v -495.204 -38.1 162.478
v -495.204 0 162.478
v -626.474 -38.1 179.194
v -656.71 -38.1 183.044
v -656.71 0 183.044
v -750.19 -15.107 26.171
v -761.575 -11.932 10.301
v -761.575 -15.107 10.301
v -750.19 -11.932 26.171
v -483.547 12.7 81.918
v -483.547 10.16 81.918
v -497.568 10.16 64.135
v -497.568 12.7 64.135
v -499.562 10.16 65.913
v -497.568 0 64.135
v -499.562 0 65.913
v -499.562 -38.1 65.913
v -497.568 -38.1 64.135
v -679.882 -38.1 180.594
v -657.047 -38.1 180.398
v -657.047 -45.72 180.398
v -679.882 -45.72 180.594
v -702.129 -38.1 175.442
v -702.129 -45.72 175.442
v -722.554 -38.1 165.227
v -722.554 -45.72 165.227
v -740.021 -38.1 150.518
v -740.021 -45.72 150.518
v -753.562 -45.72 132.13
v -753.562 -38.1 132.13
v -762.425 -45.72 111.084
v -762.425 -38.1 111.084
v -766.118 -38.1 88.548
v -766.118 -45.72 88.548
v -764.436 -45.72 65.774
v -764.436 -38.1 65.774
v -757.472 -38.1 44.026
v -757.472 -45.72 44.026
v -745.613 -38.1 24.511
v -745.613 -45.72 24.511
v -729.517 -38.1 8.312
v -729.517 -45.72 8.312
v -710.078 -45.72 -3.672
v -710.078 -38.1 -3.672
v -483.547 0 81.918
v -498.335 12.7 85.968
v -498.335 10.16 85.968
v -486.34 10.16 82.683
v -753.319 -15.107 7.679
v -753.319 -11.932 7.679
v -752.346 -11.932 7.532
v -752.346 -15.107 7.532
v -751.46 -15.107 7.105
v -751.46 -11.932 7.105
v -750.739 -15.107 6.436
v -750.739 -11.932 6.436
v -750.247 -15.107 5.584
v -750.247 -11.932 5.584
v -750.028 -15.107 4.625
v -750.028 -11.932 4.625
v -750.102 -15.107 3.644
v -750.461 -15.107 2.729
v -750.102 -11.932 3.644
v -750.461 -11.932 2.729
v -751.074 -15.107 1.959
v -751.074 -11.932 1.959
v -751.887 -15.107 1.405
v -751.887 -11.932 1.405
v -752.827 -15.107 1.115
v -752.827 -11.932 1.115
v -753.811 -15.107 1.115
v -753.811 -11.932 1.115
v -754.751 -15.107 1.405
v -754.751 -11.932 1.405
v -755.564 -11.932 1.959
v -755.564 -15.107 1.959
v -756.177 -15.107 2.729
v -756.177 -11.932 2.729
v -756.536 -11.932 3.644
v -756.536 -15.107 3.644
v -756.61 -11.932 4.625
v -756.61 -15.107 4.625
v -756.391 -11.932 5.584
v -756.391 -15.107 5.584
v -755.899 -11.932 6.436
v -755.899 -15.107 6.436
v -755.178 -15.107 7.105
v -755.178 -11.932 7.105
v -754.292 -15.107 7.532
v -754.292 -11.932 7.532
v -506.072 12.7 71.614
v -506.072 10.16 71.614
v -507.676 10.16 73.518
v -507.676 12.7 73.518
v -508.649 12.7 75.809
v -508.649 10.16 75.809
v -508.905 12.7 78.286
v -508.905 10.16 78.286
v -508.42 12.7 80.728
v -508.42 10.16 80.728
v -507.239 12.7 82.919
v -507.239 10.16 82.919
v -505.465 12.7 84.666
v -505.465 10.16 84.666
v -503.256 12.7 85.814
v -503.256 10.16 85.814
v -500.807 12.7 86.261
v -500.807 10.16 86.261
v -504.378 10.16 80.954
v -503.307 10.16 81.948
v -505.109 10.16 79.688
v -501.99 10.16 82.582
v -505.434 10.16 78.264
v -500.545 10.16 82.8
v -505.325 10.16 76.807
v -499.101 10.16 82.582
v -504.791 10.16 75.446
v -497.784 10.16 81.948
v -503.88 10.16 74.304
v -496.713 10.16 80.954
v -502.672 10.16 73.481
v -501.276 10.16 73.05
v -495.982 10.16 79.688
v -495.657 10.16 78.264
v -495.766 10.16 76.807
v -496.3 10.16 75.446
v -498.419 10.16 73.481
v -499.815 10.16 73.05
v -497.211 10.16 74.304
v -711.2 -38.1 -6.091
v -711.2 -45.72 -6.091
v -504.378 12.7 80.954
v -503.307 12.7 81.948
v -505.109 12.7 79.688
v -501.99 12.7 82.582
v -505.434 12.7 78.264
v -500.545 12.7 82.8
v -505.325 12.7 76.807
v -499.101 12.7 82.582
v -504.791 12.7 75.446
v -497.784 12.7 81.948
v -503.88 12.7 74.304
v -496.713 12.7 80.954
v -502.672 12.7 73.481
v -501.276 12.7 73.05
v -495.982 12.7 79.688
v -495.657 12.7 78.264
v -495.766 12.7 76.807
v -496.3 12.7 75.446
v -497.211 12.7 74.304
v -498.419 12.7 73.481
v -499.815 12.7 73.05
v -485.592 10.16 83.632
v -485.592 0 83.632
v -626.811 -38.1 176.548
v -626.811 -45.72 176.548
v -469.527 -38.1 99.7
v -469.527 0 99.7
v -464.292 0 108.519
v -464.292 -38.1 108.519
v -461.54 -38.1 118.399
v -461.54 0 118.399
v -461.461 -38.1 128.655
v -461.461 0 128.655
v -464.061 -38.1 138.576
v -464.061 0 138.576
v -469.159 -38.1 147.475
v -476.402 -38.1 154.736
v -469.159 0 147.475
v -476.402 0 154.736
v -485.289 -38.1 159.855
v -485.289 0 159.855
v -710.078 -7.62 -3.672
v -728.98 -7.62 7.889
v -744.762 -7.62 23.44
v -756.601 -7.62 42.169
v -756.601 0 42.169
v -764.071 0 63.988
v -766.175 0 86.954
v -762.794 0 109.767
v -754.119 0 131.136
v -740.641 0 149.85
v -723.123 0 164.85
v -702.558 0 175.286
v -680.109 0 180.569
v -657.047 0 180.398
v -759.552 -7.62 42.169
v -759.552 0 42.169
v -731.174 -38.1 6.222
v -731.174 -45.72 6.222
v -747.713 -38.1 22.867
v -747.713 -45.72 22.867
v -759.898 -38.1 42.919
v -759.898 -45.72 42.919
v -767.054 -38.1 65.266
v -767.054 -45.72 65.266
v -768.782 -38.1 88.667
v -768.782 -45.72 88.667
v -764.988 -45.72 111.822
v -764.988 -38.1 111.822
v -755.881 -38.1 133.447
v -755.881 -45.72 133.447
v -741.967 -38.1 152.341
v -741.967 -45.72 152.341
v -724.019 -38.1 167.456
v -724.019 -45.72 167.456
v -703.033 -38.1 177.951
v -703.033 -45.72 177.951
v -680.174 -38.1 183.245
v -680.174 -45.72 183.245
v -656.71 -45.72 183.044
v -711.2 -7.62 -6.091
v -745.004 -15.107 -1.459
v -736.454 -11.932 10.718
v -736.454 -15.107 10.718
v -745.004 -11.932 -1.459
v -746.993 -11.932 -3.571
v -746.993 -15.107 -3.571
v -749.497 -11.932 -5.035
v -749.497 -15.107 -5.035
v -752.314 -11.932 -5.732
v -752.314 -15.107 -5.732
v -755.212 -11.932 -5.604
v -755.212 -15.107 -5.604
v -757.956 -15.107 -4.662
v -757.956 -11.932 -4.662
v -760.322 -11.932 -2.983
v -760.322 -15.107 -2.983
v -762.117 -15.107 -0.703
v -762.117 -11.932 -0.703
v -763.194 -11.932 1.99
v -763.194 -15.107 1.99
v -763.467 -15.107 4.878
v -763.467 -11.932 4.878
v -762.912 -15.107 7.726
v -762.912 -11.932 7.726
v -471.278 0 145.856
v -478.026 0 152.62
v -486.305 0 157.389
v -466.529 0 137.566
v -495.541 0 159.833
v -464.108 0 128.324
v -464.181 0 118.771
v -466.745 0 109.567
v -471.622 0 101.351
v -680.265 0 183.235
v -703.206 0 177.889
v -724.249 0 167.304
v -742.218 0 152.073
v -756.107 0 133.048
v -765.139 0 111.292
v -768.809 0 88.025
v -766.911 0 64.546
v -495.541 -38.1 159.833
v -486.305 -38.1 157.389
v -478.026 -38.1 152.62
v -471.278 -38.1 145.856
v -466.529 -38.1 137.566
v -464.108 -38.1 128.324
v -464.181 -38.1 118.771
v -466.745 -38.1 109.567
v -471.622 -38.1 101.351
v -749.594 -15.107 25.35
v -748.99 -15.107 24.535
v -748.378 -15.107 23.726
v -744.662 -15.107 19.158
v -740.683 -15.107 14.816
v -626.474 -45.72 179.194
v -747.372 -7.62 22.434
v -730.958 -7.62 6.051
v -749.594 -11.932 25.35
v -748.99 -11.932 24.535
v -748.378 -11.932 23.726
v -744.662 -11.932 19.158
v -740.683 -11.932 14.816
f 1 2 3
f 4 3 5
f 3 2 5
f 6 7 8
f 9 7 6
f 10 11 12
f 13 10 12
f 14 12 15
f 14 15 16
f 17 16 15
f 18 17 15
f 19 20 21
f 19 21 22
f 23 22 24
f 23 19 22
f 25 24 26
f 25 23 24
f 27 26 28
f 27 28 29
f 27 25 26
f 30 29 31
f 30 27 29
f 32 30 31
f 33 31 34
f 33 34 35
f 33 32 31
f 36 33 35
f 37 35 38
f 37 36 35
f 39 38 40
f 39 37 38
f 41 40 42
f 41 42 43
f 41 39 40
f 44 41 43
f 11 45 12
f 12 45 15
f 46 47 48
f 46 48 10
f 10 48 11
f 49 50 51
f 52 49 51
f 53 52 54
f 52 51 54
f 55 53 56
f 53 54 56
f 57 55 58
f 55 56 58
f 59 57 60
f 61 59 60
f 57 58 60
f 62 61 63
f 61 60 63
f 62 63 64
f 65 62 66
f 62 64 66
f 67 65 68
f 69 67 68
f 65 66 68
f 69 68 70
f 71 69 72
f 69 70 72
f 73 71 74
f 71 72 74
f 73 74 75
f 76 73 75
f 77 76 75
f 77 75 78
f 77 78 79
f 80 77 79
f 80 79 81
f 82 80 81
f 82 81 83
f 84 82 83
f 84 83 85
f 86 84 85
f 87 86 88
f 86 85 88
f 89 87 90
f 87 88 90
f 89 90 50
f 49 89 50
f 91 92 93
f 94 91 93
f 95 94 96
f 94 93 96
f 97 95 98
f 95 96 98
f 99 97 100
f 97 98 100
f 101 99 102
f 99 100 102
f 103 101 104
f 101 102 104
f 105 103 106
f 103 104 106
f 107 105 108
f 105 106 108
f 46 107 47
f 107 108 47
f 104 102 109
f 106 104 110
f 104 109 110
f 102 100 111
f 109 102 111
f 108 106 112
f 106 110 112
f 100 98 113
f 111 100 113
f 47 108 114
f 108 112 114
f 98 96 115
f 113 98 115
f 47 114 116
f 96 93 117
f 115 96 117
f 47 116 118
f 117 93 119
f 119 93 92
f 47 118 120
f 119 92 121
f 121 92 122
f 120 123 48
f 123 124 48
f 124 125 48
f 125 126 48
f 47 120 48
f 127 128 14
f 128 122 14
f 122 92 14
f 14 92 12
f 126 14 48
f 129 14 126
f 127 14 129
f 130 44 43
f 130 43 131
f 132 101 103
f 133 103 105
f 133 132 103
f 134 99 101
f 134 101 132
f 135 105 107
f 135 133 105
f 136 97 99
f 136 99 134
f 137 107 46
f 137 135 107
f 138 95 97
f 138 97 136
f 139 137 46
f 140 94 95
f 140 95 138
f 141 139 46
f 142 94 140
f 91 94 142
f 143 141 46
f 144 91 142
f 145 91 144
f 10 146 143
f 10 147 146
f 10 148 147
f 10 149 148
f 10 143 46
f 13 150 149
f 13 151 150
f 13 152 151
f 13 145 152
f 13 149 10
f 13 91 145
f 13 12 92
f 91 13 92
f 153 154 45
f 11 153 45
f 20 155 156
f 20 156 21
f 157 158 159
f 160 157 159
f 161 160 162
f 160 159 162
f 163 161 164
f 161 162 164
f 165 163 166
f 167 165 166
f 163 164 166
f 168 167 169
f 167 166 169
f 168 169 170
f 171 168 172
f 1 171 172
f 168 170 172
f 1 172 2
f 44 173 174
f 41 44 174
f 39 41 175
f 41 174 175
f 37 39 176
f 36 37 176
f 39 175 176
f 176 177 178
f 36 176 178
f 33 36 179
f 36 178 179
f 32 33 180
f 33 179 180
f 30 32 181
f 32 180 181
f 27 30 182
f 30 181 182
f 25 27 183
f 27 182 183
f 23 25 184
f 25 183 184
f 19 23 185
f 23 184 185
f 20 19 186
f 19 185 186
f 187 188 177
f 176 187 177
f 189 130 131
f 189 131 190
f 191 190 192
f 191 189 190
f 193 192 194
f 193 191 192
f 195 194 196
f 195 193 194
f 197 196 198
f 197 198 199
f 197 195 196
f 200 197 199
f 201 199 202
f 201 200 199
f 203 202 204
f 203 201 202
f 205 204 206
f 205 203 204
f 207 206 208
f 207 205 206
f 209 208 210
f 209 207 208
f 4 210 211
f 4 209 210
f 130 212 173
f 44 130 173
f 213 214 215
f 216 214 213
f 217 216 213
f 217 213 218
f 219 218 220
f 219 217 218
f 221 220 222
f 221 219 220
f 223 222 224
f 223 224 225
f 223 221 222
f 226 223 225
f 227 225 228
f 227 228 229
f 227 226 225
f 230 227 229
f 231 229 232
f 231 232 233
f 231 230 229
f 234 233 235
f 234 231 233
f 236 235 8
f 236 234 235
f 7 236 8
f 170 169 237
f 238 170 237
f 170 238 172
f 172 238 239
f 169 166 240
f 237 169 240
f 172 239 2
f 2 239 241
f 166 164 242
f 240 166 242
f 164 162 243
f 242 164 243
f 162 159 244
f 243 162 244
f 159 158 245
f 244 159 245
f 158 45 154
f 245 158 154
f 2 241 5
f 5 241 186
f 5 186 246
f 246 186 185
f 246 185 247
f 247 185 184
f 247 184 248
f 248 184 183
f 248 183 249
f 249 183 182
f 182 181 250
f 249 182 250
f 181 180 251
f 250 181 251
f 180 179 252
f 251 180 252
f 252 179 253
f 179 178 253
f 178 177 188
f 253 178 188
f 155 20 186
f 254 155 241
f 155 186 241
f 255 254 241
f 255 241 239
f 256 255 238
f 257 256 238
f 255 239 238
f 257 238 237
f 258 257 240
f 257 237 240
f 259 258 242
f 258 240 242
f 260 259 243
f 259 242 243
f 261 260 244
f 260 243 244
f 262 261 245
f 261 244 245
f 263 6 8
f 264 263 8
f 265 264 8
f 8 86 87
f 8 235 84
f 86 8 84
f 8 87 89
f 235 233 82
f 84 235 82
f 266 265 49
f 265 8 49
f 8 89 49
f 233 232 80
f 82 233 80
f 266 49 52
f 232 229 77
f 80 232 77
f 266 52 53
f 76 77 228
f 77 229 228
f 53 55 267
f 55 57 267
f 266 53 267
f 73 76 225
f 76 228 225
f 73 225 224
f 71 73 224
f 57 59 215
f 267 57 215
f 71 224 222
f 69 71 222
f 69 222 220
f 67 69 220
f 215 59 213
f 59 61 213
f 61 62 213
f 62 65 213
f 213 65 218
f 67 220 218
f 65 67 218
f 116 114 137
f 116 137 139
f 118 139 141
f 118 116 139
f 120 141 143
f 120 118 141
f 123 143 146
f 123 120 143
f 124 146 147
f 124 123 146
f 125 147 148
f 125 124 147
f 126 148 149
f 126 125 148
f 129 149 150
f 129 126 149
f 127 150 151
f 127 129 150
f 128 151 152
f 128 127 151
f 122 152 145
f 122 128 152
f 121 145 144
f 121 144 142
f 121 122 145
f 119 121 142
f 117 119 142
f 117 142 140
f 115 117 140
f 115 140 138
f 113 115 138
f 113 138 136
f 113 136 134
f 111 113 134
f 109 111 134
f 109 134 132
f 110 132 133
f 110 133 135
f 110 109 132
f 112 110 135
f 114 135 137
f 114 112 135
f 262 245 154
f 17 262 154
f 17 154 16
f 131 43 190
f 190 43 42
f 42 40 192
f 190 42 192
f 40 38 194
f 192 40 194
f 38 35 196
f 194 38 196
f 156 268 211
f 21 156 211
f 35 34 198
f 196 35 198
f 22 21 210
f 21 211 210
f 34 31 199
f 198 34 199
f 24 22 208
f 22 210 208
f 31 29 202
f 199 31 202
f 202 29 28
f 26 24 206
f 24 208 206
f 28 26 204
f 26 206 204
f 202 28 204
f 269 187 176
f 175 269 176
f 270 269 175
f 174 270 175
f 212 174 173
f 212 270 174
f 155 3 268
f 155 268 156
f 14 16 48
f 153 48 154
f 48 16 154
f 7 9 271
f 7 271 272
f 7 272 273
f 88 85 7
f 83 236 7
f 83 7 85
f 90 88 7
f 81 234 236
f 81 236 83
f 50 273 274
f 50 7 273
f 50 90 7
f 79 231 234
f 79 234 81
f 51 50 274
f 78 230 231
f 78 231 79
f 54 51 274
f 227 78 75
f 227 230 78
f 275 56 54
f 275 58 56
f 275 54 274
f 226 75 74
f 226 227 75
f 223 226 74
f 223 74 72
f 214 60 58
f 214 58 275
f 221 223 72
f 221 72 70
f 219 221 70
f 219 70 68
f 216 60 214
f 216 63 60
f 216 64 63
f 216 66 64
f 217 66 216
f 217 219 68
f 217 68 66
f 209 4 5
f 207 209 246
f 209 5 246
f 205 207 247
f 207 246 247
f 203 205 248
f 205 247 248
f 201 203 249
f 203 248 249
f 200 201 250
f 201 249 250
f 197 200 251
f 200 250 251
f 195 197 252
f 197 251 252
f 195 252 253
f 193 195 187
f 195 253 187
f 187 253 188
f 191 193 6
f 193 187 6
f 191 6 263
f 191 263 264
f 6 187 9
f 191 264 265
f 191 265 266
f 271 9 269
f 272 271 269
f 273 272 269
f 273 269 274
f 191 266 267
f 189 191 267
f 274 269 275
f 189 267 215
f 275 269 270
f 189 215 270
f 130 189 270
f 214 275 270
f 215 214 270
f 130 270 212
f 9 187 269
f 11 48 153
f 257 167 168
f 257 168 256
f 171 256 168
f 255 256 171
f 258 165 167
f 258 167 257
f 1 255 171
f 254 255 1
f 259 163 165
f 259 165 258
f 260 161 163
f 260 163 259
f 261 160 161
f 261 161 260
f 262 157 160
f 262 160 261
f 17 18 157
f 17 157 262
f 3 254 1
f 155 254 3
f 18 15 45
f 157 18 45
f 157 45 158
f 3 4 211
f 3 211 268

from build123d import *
from build123d.topology import SkipClean

# Parameters (mm, degrees)
BASE_FLANGE1_DEPTH  = 38.1
CUT_EXTRUDE1_DEPTH  = 7.62
SKETCH9_R           = 3.3
BOSS_EXTRUDE1_DEPTH = 3.175
BOSS_EXTRUDE2_DEPTH = 7.62
BOSS_EXTRUDE4_DEPTH = 10.16
SKETCH14_R          = 4.9022
BOSS_EXTRUDE5_DEPTH = 2.54


# Sheet-metal steps are written as plain solids
with BuildPart() as part:
    # Sketch1 → Base-Flange1 (new body)
    with BuildSketch(Plane(origin=(0, 0, 0), x_dir=(1, 0, 0), z_dir=(0, 1, 0))):
        with BuildLine():
            Line((-657.047015903, -180.398251424), (-495.540915967, -159.83264605))
            ThreePointArc((-495.540915967, -159.83264605), (-466.529161595, -137.56639807), (-471.621526187, -101.351269827))
            Line((-471.621526187, -101.351269827), (-499.562056453, -65.912999952))
            Line((-499.562056453, -65.912999952), (-497.56764915, -64.134999952))
            Line((-497.56764915, -64.134999952), (-469.527179345, -99.700027778))
            ThreePointArc((-469.527179345, -99.700027778), (-464.060656724, -138.576037958), (-495.204030033, -162.478283377))
            Line((-495.204030033, -162.478283377), (-656.710129969, -183.043888751))
            ThreePointArc((-656.710129969, -183.043888751), (-764.987734735, -111.822063922), (-711.2, 6.090902363))
            Line((-711.2, 6.090902363), (-710.077660148, 3.671554877))
            ThreePointArc((-710.077660148, 3.671554877), (-762.424972114, -111.083730158), (-657.047015903, -180.398251424))
        make_face()
    extrude(amount=-BASE_FLANGE1_DEPTH)

    # Sketch7 → Cut-Extrude1 (cut)
    with BuildSketch(Plane(origin=(-711.2, 0, -6.090902363), x_dir=(1, 0, 0), z_dir=(0, 1, 0))):
        with BuildLine():
            Line((1.122339852, -2.419347486), (0, 0))
            ThreePointArc((0, 0), (-28.443609249, -19.854342865), (-48.352212426, -48.26))
            Line((-48.352212426, -48.26), (-45.400744677, -48.26))
            ThreePointArc((-45.400744677, -48.26), (-26.116771828, -21.302890058), (1.122339852, -2.419347486))
        make_face()
    extrude(amount=-CUT_EXTRUDE1_DEPTH, mode=Mode.SUBTRACT)

    # Sketch9 → Boss-Extrude1 (add)
    with BuildSketch(Plane(origin=(0, -11.93175668, 0), x_dir=(1, 0, 0), z_dir=(0, 1, 0))):
        with BuildLine():
            ThreePointArc((-745.00372812, 1.45947251), (-759.199076387, 3.906966827), (-761.574552778, -10.300610474))
            Line((-761.574552778, -10.300610474), (-750.190181644, -26.170892956))
            ThreePointArc((-750.190181644, -26.170892956), (-749.293417822, -24.941724272), (-748.377980117, -23.726399288))
            ThreePointArc((-748.377980117, -23.726399288), (-742.704728301, -16.957559782), (-736.454096434, -10.717962385))
            Line((-736.454096434, -10.717962385), (-745.00372812, 1.45947251))
        make_face()
        with Locations(Location((-753.318959287, -4.37855204, 0), (0, 0, 270))):
            Circle(SKETCH9_R, mode=Mode.SUBTRACT)
    extrude(amount=-BOSS_EXTRUDE1_DEPTH)

    # Sketch10 → Boss-Extrude2 (add)
    with SkipClean():  # the faces are left unmerged after this step: merging them gives an invalid solid
        with BuildSketch(Plane.XZ.offset(38.1)):
            with BuildLine():
                Line((-710.077660148, -3.671554877), (-711.2, -6.090902363))
                ThreePointArc((-711.2, -6.090902363), (-764.987734735, 111.822063922), (-656.710129969, 183.043888751))
                Line((-656.710129969, 183.043888751), (-626.474274799, 179.193763797))
                Line((-626.474274799, 179.193763797), (-626.811160733, 176.54812647))
                Line((-626.811160733, 176.54812647), (-657.047015903, 180.398251424))
                ThreePointArc((-657.047015903, 180.398251424), (-762.424972114, 111.083730158), (-710.077660148, -3.671554877))
            make_face()
        extrude(amount=BOSS_EXTRUDE2_DEPTH)

    # Sketch12 → Boss-Extrude4 (add)
    with SkipClean():  # the faces are left unmerged after this step: merging them gives an invalid solid
        with BuildSketch(Plane(origin=(0, 0, 0), x_dir=(1, 0, 0), z_dir=(0, 1, 0))):
            Polygon((-497.56764915, -64.134999952), (-499.562056453, -65.912999952), (-485.59179132, -83.632134889), (-483.547414248, -81.917513865), align=None)
        extrude(amount=BOSS_EXTRUDE4_DEPTH)

    # Sketch14 → Boss-Extrude5 (add)
    with SkipClean():  # the faces are left unmerged after this step: merging them gives an invalid solid
        with BuildSketch(Plane(origin=(0, 10.16, 0), x_dir=(1, 0, 0), z_dir=(0, 1, 0))):
            with BuildLine():
                Line((-483.547414248, -81.917513865), (-497.56764915, -64.134999952))
                Line((-497.56764915, -64.134999952), (-506.071656266, -71.613711984))
                ThreePointArc((-506.071656266, -71.613711984), (-507.911682699, -81.867815661), (-498.334671428, -85.968205228))
                Line((-498.334671428, -85.968205228), (-483.547414248, -81.917513865))
            make_face()
            with Locations(Location((-500.545493785, -77.897484492, 0), (0, 0, 270))):
                Circle(SKETCH14_R, mode=Mode.SUBTRACT)
        extrude(amount=BOSS_EXTRUDE5_DEPTH)


solid = part.part
